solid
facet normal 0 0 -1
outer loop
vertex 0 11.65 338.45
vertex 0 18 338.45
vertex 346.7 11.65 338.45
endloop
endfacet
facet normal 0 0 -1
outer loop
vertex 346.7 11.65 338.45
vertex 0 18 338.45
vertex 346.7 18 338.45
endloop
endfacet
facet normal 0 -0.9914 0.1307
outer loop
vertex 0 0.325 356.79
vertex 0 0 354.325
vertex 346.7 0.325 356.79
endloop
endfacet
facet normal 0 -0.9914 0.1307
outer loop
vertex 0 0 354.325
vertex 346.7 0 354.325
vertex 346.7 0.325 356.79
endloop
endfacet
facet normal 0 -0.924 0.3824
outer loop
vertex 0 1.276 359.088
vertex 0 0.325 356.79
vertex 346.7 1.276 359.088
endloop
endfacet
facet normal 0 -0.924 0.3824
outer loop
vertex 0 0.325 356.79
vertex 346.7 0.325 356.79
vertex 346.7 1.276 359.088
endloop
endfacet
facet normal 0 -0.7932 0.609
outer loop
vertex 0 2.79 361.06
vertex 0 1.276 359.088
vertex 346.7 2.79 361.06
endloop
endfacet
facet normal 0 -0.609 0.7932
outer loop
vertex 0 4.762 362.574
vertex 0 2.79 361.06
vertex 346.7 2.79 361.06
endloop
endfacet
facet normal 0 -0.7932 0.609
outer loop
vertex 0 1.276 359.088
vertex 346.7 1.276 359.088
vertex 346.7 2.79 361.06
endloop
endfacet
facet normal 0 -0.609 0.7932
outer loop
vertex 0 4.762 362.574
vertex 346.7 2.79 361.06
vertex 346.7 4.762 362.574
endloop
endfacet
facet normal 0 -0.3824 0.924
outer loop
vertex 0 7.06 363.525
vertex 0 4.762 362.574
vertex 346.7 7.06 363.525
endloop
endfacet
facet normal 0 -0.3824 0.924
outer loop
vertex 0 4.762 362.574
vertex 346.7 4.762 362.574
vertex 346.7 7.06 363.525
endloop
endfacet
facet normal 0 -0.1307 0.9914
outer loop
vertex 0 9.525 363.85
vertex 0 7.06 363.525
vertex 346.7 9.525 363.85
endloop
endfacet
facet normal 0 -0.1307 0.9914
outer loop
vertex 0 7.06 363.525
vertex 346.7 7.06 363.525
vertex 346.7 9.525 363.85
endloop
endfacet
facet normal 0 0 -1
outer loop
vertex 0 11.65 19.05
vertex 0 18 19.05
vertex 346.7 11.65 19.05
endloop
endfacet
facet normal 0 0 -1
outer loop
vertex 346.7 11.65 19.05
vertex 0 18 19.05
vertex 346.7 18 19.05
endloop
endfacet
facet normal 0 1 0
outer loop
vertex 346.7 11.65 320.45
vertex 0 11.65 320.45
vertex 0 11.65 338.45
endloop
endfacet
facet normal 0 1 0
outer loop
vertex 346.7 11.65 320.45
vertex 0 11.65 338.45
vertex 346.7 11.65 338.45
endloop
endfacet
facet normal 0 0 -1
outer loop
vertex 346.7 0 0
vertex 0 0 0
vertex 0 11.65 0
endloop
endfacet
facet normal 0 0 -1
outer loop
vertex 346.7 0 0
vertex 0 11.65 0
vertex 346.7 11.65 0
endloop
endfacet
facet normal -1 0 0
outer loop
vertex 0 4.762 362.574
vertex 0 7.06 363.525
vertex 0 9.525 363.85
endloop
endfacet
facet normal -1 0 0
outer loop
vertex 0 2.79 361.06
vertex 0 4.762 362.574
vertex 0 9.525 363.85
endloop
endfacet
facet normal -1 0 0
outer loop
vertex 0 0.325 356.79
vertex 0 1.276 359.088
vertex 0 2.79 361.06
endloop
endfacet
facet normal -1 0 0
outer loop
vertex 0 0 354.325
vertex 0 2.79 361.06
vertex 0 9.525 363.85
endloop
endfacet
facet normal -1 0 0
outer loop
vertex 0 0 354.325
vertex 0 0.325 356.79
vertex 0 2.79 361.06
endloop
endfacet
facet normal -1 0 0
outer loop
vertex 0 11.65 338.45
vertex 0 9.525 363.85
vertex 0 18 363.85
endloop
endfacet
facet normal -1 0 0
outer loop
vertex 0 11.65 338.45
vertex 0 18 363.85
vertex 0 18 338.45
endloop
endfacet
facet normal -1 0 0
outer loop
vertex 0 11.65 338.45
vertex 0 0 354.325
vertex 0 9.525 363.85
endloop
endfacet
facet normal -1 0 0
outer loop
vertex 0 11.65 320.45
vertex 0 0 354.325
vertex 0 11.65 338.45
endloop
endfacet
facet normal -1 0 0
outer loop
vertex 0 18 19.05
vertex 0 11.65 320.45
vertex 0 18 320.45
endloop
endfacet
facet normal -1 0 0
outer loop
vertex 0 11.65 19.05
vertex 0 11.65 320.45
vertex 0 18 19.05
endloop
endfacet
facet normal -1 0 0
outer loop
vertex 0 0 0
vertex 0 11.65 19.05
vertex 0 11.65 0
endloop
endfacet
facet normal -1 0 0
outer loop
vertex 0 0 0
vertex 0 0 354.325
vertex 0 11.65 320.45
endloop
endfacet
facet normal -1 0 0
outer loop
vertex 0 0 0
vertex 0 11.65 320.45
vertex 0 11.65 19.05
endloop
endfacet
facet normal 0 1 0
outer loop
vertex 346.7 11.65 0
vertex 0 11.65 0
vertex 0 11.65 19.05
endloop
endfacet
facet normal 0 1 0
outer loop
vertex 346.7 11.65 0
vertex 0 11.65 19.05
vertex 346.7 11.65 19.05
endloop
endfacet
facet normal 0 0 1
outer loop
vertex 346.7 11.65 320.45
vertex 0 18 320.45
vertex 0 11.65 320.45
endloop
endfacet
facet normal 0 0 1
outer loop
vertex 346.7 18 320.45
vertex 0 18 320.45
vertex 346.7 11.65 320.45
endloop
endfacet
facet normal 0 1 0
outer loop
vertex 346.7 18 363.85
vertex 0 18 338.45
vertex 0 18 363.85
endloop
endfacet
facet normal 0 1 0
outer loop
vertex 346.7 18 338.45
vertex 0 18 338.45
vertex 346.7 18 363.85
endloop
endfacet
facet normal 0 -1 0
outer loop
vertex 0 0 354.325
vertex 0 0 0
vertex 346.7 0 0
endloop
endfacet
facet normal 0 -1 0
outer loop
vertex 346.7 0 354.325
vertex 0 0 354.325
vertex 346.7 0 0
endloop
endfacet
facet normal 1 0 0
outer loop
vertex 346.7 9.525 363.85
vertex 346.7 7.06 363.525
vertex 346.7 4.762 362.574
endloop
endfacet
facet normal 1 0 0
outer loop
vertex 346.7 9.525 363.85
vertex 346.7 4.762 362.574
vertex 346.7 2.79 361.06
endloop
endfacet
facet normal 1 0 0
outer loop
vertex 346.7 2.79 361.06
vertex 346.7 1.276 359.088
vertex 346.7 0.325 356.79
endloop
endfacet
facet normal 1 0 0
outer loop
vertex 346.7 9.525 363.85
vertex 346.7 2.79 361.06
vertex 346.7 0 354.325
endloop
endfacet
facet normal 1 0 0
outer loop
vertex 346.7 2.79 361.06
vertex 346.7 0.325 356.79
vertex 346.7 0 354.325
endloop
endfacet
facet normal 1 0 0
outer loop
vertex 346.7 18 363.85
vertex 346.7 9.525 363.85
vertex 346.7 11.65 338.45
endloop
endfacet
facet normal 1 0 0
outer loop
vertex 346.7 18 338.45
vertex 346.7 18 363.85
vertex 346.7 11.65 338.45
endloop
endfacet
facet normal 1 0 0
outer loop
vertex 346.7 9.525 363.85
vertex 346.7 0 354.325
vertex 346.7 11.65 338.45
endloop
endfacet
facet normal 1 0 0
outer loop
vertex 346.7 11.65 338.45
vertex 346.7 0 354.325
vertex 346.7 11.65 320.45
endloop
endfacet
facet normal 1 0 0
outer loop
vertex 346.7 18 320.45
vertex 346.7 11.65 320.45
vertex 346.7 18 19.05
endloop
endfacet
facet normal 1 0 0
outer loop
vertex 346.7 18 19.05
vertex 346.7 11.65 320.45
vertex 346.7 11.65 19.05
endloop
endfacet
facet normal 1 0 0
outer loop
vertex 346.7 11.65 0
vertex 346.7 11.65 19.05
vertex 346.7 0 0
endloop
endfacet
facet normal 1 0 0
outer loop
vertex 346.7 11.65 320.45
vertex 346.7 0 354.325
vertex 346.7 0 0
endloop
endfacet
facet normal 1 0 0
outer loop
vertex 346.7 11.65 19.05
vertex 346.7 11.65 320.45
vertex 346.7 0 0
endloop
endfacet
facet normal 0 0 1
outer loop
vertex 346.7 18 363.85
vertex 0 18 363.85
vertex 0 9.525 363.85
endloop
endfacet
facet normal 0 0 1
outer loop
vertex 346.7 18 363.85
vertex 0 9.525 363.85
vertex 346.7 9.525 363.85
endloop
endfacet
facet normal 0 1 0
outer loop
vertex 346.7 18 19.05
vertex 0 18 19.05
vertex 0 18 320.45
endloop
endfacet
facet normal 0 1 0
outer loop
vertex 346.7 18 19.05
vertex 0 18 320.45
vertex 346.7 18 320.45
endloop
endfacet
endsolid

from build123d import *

# Parameters (mm, degrees)
SKETCH1_W           = 346.7
SKETCH1_H           = 376.55000001
BOSS_EXTRUDE1_DEPTH = 18
SKETCH2_W           = 346.7
SKETCH2_H           = 18
CUT_EXTRUDE1_DEPTH  = 6.35
FILLET1_R           = 9.525
SKETCH3_W           = 346.7
SKETCH3_H           = 19.05
CUT_EXTRUDE2_DEPTH  = 6.35
SKETCH4_W           = 346.7
SKETCH4_H           = 12.7
CUT_EXTRUDE3_DEPTH  = 19
FILLET2_R           = 9.525


with BuildPart() as part:
    # Sketch1 → Boss-Extrude1 (new body)
    with BuildSketch(Plane(origin=(0, 0, 0), x_dir=(1, 0, 0), z_dir=(0, 1, 0))):
        with Locations((173.35, -188.275000005)):
            Rectangle(SKETCH1_W, SKETCH1_H)
    extrude(amount=BOSS_EXTRUDE1_DEPTH)

    # Sketch2 → Cut-Extrude1 (cut)
    with BuildSketch(Plane(origin=(0, 18, 0), x_dir=(1, 0, 0), z_dir=(0, 1, 0))):
        with Locations((173.35, -329.45000001)):
            Rectangle(SKETCH2_W, SKETCH2_H)
    extrude(amount=-CUT_EXTRUDE1_DEPTH, mode=Mode.SUBTRACT)

    # Fillet1
    fillet1_edges = [part.edges().sort_by_distance(p)[0] for p in [
        (173.35, 0, 376.55000001),
    ]]
    fillet(fillet1_edges, radius=FILLET1_R)

    # Sketch3 → Cut-Extrude2 (cut)
    with BuildSketch(Plane(origin=(0, 18, 0), x_dir=(1, 0, 0), z_dir=(0, 1, 0))):
        with Locations((173.35, -9.525)):
            Rectangle(SKETCH3_W, SKETCH3_H)
    extrude(amount=-CUT_EXTRUDE2_DEPTH, mode=Mode.SUBTRACT)

    # Sketch4 → Cut-Extrude3 (cut, through all)
    with BuildSketch(Plane(origin=(0, 18, 0), x_dir=(1, 0, 0), z_dir=(0, 1, 0))):
        with Locations((173.35, -370.20000001)):
            Rectangle(SKETCH4_W, SKETCH4_H)
    extrude(amount=-CUT_EXTRUDE3_DEPTH, mode=Mode.SUBTRACT)

    # Fillet2
    fillet2_edges = [part.edges().sort_by_distance(p)[0] for p in [
        (173.35, 0, 363.85000001),
    ]]
    fillet(fillet2_edges, radius=FILLET2_R)


solid = part.part
